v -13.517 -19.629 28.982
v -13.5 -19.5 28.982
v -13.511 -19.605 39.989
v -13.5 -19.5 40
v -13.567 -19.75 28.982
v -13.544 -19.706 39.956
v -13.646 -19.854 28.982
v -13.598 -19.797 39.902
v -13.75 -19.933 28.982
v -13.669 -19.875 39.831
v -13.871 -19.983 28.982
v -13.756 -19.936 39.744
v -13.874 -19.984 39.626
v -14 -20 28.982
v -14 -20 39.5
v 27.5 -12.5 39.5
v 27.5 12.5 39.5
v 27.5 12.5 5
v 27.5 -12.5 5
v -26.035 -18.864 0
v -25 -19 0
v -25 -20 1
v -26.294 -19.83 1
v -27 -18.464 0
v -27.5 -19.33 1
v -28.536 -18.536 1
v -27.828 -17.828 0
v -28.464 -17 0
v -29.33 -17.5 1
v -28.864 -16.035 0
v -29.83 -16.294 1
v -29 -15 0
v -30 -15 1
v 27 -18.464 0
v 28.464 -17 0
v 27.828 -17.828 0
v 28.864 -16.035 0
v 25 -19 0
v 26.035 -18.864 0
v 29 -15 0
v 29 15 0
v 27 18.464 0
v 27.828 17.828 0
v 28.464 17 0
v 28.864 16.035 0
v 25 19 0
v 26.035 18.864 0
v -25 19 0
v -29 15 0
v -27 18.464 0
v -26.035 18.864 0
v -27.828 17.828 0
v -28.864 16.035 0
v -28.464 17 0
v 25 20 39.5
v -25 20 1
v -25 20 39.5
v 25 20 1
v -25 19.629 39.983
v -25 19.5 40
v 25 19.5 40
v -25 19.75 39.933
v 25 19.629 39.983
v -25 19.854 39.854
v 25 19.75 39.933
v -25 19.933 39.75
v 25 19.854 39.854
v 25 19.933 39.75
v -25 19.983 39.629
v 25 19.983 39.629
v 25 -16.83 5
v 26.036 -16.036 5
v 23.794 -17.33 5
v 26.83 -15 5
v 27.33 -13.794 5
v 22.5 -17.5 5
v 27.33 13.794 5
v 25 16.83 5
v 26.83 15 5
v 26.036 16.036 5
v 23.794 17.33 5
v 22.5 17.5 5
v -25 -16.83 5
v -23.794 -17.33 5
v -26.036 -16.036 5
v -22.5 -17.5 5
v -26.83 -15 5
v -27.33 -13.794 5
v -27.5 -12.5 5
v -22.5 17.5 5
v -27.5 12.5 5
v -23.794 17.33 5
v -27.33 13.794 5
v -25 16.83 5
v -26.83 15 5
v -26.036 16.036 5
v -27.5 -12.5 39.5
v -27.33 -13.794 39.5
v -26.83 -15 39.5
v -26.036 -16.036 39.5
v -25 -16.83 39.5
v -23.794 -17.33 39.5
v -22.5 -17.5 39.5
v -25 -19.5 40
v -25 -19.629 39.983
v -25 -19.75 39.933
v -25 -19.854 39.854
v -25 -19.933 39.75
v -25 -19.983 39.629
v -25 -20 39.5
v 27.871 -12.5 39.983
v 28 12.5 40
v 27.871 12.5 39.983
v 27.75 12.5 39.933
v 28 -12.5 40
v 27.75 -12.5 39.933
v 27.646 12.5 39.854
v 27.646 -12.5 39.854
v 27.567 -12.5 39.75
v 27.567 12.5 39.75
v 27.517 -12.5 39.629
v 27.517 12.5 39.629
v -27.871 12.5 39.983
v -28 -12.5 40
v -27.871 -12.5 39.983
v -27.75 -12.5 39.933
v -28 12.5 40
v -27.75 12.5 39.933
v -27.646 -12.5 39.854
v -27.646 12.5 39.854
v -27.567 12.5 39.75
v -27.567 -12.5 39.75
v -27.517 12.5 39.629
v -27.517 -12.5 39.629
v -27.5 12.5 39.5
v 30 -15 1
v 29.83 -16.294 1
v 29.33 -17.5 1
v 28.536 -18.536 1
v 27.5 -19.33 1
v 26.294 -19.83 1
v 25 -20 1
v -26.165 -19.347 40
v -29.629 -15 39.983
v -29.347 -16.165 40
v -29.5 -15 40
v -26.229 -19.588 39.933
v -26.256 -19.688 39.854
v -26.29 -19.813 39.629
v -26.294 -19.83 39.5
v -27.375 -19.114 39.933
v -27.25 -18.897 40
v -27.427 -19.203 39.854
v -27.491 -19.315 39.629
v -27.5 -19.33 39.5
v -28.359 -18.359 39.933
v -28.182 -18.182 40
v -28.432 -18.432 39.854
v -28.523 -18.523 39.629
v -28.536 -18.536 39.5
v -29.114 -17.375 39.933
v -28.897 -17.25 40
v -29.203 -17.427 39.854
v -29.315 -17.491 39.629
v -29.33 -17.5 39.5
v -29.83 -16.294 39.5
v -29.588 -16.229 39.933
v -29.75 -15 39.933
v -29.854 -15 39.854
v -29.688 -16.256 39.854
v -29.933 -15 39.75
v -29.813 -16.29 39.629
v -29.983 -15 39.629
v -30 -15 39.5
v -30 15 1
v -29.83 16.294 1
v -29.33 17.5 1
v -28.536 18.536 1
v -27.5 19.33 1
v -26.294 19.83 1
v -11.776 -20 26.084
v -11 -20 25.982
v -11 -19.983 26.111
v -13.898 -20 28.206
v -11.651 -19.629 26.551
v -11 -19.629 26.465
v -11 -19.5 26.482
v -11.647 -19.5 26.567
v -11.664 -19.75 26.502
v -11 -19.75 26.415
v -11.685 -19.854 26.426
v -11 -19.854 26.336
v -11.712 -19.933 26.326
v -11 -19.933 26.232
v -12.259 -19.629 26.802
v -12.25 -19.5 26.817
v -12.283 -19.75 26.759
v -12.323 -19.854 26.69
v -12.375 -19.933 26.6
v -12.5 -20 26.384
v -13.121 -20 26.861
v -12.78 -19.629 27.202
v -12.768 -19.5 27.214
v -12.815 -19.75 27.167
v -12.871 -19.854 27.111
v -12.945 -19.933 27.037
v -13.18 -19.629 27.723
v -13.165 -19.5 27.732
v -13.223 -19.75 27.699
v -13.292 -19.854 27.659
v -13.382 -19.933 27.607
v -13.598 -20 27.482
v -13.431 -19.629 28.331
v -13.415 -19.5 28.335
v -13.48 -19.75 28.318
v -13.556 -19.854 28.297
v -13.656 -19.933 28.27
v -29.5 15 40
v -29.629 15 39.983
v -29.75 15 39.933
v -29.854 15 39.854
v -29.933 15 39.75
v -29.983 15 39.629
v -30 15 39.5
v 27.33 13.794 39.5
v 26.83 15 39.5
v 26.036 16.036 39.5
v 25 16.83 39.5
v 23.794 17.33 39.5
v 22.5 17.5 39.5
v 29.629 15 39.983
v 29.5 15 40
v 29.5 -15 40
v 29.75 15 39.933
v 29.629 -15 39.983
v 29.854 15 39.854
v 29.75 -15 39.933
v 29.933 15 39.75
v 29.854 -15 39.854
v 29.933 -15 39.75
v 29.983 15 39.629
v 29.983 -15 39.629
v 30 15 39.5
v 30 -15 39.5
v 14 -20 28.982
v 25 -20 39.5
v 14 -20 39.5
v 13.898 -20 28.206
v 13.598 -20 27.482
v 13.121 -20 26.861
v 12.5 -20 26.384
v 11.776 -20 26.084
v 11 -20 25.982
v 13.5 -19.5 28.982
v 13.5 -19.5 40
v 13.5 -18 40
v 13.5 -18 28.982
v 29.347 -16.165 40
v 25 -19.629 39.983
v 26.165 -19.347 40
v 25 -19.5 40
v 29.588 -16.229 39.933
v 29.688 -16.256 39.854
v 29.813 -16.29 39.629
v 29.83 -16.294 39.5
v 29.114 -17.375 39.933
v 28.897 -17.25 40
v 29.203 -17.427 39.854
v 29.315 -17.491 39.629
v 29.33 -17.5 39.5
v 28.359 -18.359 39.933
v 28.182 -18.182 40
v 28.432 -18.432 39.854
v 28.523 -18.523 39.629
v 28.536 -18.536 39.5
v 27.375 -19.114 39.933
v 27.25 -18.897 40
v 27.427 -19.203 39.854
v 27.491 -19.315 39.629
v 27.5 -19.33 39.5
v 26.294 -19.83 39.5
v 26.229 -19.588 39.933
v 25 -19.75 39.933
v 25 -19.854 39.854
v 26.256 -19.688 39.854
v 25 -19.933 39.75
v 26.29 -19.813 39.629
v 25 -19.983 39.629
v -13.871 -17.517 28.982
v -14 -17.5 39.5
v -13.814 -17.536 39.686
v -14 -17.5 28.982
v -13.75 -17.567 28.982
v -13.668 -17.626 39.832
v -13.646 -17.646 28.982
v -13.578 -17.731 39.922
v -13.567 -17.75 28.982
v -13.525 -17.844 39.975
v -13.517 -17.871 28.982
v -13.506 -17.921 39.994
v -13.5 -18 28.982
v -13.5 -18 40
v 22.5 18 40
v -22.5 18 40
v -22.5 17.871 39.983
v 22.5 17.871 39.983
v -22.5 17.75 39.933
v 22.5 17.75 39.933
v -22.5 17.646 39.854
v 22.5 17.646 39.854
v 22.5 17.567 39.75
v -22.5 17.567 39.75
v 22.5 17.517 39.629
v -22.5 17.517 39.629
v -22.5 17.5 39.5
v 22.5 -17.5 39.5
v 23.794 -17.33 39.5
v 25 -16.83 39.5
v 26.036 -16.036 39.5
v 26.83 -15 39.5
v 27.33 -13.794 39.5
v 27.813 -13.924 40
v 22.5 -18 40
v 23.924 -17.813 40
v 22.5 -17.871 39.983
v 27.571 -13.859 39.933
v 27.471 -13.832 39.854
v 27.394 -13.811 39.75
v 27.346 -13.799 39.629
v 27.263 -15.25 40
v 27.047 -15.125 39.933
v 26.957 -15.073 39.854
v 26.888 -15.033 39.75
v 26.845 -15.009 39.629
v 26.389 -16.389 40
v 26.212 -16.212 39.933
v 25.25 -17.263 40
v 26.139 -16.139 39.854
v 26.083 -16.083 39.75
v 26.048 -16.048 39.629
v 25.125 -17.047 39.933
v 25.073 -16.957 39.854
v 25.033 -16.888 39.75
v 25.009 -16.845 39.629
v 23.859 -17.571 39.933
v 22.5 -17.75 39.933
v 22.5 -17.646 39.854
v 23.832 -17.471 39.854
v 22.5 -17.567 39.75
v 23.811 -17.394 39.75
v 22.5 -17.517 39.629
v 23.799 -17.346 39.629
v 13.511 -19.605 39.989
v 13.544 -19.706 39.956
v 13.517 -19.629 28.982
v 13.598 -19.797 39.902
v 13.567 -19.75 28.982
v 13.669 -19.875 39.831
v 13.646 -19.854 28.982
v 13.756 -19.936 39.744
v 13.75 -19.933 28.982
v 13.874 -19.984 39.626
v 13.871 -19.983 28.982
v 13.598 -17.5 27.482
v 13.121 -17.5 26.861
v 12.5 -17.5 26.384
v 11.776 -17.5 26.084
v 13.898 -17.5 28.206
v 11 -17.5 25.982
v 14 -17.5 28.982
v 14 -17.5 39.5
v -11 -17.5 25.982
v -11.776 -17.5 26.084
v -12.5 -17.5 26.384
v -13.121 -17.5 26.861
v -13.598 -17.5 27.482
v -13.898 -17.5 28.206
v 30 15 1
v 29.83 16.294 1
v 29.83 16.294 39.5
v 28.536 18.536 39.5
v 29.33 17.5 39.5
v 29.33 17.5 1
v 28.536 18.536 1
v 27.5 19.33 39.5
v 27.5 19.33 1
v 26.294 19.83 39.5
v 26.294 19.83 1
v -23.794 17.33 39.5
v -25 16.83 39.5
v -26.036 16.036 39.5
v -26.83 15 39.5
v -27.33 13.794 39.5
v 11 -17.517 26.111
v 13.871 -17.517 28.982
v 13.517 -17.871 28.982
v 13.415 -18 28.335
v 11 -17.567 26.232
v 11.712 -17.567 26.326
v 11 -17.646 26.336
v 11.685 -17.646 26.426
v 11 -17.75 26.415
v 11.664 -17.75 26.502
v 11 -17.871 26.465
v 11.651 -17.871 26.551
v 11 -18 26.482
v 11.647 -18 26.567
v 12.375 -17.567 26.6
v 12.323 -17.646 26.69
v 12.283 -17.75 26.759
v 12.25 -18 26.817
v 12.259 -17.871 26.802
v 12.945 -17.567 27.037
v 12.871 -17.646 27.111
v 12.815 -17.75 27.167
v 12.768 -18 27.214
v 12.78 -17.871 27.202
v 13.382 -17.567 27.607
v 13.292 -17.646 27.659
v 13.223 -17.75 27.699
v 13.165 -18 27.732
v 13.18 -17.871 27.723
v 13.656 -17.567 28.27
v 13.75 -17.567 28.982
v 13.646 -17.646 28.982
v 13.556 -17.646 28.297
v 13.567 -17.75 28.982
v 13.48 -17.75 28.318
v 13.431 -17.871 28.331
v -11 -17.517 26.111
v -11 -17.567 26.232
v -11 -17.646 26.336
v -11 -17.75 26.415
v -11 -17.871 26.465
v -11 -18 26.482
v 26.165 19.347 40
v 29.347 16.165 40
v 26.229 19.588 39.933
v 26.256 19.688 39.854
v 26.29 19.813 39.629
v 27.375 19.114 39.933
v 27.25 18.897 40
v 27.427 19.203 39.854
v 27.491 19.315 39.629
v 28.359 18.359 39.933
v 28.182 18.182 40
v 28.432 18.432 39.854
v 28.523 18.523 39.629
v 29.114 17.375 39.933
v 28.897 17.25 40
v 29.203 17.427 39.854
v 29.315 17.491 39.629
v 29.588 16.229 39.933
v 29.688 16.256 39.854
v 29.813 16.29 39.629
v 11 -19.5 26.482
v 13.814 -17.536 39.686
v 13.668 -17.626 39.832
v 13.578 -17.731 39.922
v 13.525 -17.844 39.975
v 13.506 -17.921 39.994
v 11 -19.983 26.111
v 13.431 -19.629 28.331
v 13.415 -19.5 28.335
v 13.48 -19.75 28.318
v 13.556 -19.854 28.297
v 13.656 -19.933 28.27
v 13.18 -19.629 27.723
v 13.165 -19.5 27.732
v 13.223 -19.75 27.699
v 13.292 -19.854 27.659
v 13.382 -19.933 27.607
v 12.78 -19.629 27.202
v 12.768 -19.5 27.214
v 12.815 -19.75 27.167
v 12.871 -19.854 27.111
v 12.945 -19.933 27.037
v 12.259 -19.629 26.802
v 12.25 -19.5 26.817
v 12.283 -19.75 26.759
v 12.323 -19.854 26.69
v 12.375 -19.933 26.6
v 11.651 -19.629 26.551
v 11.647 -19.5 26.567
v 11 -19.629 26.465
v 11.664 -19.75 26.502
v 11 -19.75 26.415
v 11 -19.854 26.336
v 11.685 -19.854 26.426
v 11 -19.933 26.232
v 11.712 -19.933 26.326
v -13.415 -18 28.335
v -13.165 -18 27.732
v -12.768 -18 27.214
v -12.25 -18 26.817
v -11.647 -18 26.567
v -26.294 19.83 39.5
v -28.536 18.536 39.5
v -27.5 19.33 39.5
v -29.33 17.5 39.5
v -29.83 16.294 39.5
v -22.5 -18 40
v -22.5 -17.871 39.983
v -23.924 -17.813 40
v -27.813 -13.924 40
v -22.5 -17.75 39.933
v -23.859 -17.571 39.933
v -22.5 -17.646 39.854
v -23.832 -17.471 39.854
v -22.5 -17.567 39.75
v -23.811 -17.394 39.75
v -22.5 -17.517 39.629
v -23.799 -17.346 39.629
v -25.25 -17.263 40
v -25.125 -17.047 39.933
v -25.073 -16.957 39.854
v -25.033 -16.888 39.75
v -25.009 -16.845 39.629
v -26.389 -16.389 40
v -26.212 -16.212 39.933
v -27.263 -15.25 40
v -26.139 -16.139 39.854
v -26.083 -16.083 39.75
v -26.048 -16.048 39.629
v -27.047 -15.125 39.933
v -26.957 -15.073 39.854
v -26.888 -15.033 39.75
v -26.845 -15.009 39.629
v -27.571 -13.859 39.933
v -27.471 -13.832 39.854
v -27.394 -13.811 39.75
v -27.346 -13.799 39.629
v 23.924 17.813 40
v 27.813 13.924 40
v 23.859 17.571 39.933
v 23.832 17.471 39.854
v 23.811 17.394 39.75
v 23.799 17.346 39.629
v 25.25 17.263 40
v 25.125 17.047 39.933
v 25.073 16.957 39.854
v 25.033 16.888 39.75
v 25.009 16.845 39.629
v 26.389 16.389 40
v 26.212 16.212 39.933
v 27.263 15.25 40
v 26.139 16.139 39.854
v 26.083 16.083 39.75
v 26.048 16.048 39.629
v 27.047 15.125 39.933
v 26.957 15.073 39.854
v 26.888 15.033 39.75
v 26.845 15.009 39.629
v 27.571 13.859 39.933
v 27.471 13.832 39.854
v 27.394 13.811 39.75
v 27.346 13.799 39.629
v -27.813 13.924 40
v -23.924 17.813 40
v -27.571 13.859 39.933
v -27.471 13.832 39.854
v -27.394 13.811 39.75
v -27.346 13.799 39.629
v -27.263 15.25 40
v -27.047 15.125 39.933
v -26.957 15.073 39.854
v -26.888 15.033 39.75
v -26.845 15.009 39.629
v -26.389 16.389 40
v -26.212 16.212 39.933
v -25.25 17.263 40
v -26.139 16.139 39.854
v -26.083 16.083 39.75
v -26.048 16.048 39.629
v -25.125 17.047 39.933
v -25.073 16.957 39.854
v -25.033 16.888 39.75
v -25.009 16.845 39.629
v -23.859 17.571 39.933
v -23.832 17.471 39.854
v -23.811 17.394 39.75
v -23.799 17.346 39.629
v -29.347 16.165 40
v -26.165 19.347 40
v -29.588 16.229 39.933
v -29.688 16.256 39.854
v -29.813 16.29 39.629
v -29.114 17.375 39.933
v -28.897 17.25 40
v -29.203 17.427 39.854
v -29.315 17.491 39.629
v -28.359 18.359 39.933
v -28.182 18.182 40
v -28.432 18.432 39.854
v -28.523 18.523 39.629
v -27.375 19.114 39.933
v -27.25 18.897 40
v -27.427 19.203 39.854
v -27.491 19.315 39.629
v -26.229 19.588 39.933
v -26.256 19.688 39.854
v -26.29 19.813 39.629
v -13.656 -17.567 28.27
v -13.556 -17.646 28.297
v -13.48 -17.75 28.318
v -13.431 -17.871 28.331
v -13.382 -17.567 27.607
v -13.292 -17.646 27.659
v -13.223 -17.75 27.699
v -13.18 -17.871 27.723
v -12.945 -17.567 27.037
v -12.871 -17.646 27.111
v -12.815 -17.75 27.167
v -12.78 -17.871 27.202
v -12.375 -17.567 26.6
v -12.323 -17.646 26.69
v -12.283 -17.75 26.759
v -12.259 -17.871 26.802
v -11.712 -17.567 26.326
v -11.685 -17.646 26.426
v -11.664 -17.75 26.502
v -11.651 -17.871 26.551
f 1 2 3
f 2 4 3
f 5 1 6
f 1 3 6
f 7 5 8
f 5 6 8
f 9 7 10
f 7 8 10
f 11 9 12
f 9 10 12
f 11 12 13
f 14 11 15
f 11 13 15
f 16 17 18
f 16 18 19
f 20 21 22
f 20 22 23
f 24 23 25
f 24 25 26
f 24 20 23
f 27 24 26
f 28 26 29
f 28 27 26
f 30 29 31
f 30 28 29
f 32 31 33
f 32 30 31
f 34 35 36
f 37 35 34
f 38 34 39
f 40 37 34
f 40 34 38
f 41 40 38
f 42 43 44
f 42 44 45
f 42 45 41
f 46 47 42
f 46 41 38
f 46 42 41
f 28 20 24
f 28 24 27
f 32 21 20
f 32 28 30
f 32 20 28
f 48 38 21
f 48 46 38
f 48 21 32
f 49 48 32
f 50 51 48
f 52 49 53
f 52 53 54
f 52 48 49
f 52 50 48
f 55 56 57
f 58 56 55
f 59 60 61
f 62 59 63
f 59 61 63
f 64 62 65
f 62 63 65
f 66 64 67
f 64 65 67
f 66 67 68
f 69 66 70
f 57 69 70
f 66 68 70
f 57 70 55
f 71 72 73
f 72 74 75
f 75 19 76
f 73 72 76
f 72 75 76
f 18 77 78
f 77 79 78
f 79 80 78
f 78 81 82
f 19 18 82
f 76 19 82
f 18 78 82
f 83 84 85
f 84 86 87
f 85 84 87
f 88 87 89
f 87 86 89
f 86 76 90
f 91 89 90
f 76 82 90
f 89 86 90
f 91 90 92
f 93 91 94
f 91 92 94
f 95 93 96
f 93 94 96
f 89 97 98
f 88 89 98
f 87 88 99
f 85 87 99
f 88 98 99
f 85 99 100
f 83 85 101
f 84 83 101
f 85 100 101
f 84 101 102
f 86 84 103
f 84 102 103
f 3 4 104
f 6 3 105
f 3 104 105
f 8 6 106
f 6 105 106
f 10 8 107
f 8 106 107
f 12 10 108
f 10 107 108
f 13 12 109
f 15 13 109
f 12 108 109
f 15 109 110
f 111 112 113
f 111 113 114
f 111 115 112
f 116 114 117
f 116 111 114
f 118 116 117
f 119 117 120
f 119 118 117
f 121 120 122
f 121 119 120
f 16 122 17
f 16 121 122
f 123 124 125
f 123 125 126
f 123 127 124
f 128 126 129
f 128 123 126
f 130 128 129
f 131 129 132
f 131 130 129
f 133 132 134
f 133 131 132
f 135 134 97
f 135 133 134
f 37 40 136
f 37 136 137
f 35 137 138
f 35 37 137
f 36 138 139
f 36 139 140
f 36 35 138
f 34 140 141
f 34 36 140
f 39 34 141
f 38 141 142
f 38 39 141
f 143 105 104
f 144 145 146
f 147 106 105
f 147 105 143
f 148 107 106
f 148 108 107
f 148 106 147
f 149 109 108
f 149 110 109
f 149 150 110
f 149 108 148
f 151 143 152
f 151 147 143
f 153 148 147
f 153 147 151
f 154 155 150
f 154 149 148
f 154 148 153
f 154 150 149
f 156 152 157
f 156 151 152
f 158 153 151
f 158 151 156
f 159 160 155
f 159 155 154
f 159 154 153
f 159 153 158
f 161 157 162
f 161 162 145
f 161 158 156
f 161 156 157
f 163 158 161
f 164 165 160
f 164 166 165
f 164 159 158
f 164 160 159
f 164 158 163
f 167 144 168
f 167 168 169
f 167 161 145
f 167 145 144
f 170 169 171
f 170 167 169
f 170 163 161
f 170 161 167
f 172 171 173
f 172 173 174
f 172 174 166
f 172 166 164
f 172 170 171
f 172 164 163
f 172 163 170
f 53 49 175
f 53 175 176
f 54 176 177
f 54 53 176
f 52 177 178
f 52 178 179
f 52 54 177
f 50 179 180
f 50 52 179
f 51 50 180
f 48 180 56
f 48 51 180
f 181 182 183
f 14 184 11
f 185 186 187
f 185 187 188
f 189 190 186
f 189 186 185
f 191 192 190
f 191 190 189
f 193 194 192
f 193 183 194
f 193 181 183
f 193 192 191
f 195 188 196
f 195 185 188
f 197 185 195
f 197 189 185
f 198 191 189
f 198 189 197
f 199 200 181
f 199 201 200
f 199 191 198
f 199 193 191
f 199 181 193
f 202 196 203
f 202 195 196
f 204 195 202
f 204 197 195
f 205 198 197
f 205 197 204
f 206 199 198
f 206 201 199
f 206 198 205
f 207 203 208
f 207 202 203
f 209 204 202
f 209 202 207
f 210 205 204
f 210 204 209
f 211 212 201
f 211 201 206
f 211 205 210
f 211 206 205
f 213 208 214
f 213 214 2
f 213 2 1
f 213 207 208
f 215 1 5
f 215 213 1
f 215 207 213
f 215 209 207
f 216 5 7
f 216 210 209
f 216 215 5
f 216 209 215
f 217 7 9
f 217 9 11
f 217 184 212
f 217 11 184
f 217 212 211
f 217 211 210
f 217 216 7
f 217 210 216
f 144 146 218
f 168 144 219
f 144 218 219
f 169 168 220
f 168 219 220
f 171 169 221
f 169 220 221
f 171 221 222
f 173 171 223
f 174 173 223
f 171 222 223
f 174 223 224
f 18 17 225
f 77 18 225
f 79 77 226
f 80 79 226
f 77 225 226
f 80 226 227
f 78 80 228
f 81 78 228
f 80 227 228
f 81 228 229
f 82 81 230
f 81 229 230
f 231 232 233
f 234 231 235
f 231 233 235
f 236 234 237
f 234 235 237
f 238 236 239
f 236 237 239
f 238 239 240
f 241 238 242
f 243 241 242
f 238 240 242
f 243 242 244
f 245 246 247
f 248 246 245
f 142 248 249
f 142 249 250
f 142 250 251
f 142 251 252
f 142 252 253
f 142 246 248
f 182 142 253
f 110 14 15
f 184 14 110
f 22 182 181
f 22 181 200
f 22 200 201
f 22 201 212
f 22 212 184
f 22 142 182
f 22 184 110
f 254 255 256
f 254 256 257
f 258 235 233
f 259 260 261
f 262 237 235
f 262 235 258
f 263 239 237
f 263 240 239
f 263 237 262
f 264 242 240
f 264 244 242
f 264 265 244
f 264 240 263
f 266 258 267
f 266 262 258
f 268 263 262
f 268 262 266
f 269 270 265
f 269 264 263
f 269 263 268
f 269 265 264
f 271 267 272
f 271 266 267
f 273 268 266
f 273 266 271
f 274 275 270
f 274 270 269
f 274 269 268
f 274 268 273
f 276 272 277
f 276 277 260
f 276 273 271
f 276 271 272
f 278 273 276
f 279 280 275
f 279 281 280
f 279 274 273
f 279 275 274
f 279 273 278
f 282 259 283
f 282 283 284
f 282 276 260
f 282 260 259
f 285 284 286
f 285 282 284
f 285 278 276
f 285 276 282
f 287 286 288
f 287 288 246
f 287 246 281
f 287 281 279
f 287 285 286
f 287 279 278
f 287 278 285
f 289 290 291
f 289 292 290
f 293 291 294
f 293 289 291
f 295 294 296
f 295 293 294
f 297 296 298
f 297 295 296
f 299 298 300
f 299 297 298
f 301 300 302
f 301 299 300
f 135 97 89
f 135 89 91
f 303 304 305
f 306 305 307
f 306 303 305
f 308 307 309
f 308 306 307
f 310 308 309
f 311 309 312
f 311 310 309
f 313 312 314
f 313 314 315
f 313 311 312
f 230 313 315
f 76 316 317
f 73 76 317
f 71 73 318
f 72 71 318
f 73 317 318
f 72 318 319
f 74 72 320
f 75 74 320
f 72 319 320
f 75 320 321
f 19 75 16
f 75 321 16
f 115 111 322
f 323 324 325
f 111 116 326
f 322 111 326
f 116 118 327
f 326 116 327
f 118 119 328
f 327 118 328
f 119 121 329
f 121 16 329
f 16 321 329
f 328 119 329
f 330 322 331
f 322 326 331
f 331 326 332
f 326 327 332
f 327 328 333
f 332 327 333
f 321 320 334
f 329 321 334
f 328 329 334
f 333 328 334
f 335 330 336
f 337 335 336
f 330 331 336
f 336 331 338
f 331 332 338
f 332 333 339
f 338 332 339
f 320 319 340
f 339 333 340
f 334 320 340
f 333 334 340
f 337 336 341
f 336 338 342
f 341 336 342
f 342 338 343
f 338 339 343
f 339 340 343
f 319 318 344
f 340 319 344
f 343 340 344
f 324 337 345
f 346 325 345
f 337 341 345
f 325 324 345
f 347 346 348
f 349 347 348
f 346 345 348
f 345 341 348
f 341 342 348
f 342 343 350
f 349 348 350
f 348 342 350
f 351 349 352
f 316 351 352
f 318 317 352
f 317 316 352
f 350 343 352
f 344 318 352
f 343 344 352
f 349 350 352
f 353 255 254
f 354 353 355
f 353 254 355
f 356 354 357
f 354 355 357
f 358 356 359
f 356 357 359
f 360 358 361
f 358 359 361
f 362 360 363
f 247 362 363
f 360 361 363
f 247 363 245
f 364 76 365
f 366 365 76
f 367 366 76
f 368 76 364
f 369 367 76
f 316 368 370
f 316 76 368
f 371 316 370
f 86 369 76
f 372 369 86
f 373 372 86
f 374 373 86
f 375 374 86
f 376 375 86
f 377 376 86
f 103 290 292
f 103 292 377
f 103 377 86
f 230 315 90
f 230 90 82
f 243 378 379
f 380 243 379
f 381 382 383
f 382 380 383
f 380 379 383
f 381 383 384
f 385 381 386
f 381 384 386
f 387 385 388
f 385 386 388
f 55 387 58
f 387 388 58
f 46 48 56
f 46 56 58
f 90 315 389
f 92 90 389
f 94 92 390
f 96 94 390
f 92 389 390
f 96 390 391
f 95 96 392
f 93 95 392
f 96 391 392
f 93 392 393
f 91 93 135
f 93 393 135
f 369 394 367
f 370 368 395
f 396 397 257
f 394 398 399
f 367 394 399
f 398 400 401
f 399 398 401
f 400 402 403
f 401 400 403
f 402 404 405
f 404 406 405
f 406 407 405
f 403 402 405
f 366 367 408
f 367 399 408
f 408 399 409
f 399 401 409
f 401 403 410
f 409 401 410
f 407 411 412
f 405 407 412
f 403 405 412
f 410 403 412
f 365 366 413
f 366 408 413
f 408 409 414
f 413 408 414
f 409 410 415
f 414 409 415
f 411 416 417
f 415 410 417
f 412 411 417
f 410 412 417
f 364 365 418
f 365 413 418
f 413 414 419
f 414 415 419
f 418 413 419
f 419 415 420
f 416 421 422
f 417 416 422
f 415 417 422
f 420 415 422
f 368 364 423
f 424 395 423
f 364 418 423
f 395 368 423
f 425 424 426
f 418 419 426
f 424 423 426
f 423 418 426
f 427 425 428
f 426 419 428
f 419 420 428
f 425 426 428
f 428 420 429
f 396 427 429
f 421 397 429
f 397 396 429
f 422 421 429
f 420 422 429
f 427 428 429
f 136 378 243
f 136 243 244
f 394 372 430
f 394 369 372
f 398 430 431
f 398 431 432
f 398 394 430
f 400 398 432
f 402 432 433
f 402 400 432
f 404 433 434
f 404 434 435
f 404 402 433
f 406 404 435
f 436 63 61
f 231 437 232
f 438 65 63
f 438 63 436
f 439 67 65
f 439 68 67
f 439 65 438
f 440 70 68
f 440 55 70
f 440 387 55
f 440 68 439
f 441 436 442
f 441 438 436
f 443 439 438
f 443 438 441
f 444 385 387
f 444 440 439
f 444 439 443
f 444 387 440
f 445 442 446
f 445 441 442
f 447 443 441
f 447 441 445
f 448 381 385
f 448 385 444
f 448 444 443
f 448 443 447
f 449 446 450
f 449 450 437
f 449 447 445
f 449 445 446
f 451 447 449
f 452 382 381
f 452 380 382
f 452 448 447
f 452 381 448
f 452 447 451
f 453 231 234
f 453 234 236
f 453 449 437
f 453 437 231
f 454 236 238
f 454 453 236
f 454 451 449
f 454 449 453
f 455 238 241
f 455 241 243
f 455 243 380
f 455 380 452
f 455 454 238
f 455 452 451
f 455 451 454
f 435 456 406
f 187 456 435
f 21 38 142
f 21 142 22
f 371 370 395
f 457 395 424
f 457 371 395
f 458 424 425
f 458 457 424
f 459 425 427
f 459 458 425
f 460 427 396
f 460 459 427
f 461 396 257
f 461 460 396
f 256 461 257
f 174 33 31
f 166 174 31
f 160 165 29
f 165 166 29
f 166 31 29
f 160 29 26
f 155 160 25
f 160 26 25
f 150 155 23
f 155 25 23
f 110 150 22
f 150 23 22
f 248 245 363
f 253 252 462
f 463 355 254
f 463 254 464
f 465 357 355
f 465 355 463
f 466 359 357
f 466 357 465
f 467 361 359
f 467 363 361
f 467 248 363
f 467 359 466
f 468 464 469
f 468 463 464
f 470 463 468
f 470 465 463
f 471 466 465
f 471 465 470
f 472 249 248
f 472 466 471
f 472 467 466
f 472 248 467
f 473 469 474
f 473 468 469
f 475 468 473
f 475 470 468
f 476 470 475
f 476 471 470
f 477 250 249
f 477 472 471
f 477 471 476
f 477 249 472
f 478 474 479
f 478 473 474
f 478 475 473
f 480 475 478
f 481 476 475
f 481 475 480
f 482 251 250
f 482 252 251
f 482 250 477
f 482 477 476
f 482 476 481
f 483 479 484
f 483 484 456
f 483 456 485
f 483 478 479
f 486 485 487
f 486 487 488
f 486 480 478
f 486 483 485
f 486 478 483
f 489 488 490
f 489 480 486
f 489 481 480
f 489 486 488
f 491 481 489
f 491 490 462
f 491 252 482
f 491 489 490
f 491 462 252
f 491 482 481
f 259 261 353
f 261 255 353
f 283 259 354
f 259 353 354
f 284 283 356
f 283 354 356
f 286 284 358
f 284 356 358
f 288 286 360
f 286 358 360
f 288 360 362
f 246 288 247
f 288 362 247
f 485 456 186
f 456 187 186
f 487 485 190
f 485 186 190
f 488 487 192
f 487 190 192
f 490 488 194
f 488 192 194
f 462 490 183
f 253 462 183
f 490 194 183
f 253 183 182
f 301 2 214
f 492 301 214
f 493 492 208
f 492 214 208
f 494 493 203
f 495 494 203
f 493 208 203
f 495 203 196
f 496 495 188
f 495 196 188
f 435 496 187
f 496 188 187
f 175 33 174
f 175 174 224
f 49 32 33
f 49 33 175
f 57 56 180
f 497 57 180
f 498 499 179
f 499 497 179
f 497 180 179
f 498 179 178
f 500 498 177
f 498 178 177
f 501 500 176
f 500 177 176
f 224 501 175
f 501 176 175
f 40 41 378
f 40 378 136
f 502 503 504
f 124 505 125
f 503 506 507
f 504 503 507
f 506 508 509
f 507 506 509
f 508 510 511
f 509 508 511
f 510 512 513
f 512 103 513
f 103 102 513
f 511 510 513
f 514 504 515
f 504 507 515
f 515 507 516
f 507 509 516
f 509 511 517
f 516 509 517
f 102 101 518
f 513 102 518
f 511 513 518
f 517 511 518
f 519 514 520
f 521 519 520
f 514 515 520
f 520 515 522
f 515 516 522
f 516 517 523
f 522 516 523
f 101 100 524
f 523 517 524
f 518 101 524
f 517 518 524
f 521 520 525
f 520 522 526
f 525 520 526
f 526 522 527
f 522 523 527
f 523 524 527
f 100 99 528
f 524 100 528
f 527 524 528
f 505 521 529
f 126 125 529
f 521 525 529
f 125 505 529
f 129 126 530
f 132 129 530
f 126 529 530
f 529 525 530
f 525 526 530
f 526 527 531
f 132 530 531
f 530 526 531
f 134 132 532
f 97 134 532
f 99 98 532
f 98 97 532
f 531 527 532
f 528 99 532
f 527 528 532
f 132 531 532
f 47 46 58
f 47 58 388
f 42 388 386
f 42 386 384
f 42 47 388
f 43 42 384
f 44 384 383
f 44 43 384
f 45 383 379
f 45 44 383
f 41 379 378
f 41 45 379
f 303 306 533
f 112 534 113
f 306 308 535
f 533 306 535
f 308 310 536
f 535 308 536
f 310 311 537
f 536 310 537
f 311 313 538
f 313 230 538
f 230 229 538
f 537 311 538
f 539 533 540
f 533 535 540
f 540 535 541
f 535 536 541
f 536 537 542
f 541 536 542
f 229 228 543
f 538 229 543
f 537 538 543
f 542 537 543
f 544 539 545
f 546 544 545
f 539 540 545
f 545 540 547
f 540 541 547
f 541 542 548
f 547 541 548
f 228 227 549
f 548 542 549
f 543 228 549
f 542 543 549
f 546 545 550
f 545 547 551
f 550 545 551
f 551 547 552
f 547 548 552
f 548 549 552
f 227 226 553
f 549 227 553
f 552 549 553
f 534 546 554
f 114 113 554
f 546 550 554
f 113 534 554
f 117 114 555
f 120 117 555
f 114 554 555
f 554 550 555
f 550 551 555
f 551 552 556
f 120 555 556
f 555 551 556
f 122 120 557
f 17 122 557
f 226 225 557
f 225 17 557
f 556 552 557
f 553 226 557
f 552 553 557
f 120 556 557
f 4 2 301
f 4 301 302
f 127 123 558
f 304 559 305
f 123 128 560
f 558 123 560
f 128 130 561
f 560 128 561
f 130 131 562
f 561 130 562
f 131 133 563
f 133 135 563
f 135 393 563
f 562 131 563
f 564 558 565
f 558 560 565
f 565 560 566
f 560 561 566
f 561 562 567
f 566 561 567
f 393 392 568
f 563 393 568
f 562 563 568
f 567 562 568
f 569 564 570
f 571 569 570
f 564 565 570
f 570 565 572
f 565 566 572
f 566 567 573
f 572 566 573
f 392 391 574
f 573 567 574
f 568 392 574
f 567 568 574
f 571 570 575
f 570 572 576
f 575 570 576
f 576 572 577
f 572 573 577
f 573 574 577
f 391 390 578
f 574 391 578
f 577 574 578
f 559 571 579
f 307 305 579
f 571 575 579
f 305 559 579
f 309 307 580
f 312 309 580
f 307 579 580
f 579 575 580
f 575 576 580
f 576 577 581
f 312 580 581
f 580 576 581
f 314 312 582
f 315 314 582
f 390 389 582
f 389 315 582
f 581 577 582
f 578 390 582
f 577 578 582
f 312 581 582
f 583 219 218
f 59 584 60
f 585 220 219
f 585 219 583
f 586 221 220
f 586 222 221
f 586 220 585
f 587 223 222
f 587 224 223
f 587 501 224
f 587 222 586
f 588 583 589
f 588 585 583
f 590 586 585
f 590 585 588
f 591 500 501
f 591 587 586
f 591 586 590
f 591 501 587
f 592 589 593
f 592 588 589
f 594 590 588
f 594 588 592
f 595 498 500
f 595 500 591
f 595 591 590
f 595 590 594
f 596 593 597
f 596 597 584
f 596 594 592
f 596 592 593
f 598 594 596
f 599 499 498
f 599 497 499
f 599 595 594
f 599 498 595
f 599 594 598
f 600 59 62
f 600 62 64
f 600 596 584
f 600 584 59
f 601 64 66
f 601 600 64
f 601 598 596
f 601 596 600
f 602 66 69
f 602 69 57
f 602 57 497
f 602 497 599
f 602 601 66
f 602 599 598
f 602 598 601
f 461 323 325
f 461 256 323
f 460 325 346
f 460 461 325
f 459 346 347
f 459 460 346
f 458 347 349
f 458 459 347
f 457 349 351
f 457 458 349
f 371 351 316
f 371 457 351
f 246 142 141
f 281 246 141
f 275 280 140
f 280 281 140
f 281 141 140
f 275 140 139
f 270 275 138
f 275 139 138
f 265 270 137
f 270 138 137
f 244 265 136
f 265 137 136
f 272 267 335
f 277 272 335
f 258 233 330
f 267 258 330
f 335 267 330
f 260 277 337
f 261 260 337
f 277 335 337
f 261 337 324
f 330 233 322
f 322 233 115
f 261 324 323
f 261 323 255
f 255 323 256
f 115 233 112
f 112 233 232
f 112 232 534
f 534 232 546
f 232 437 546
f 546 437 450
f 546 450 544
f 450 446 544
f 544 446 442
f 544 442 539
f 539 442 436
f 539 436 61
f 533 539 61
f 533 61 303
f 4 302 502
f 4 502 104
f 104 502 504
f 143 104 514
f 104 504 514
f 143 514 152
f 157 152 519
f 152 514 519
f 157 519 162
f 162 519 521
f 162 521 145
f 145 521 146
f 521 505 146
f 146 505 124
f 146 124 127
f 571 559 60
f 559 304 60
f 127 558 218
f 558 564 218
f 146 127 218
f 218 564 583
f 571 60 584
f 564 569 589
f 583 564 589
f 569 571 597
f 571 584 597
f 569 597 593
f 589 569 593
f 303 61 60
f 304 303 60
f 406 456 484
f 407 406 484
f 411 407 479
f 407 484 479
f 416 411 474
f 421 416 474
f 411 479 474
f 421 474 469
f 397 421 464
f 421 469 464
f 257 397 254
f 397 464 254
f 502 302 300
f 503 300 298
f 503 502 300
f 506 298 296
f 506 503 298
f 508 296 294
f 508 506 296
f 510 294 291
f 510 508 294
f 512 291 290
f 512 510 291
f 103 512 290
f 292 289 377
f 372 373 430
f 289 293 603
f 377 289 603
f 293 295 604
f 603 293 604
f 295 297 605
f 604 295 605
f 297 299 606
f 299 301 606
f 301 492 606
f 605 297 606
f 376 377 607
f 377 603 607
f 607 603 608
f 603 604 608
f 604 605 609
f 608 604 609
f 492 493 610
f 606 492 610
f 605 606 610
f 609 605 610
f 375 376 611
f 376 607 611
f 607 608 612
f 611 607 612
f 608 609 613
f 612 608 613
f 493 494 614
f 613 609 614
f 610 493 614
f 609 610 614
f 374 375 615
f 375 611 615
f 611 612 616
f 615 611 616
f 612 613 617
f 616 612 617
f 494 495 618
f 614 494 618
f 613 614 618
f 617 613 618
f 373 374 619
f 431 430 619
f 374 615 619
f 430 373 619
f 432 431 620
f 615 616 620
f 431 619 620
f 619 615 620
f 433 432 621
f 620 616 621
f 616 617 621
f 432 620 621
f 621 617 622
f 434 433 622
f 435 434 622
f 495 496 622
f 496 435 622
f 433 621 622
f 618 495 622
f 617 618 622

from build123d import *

# Parameters (mm, degrees)
PAD_DEPTH       = 40
POCKET_DEPTH    = 35
POCKET001_DEPTH = 5
FILLET_R        = 0.5
FILLET001_R     = 0.5
CHAMFER_SIZE    = 1


with BuildPart() as part:
    # Sketch → Pad (new body)
    with BuildSketch(Plane.XY):
        with BuildLine():
            Line((-25, 20), (25, 20))
            ThreePointArc((30, 15), (28.535534, 18.535534), (25, 20))
            Line((30, 15), (30, -15))
            ThreePointArc((25, -20), (28.535534, -18.535534), (30, -15))
            Line((25, -20), (-25, -20))
            ThreePointArc((-30, -15), (-28.535534, -18.535534), (-25, -20))
            Line((-30, -15), (-30, 15))
            ThreePointArc((-25, 20), (-28.535534, 18.535534), (-30, 15))
        make_face()
    extrude(amount=PAD_DEPTH)

    # Sketch001 (on Face10 of Pad) → Pocket (cut)
    with BuildSketch(Plane.XY.offset(40)):
        with BuildLine():
            Line((-22.5, 17.5), (22.5, 17.5))
            ThreePointArc((27.5, 12.5), (26.035534, 16.035534), (22.5, 17.5))
            Line((27.5, 12.5), (27.5, -12.5))
            ThreePointArc((22.5, -17.5), (26.035534, -16.035534), (27.5, -12.5))
            Line((22.5, -17.5), (-22.5, -17.5))
            ThreePointArc((-27.5, -12.5), (-26.035534, -16.035534), (-22.5, -17.5))
            Line((-27.5, -12.5), (-27.5, 12.5))
            ThreePointArc((-22.5, 17.5), (-26.035534, 16.035534), (-27.5, 12.5))
        make_face()
    extrude(amount=-POCKET_DEPTH, mode=Mode.SUBTRACT)

    # Sketch002 (on Face6 of Pocket) → Pocket001 (cut)
    with BuildSketch(Plane.XZ.offset(20)):
        with BuildLine():
            Line((-13.5, 40), (13.5, 40))
            Line((13.5, 40), (13.5, 28.982013))
            ThreePointArc((11, 26.482013), (12.767767, 27.214246), (13.5, 28.982013))
            Line((11, 26.482013), (-11, 26.482013))
            ThreePointArc((-13.5, 28.982013), (-12.767767, 27.214246), (-11, 26.482013))
            Line((-13.5, 28.982013), (-13.5, 40))
        make_face()
    extrude(amount=-POCKET001_DEPTH, mode=Mode.SUBTRACT)

    # Fillet
    fillet_edges = [part.edges().sort_by_distance(p)[0] for p in [
        (13.5, -17.5, 34.491006),
        (12.767767, -17.5, 27.214246),
        (0, -17.5, 26.482013),
        (-12.767767, -17.5, 27.214246),
        (-13.5, -17.5, 34.491006),
        (-18, -17.5, 40),
        (-26.035534, -16.035534, 40),
        (-27.5, 0, 40),
        (-26.035534, 16.035534, 40),
        (0, 17.5, 40),
        (26.035534, 16.035534, 40),
        (27.5, 0, 40),
        (26.035534, -16.035534, 40),
        (18, -17.5, 40),
    ]]
    fillet(fillet_edges, radius=FILLET_R)

    # Fillet001
    fillet001_edges = [part.edges().sort_by_distance(p)[0] for p in [
        (-19.25, -20, 40),
        (-13.5, -20, 34.491006),
        (-12.767767, -20, 27.214246),
        (0, -20, 26.482013),
        (12.767767, -20, 27.214246),
        (13.5, -20, 34.491006),
        (19.25, -20, 40),
        (28.535534, -18.535534, 40),
        (30, 0, 40),
        (28.535534, 18.535534, 40),
        (0, 20, 40),
        (-28.535534, 18.535534, 40),
        (-30, 0, 40),
        (-28.535534, -18.535534, 40),
    ]]
    fillet(fillet001_edges, radius=FILLET001_R)

    # Chamfer
    chamfer_edges = [part.edges().sort_by_distance(p)[0] for p in [
        (0, -20, 0),
        (28.535534, -18.535534, 0),
        (30, 0, 0),
        (28.535534, 18.535534, 0),
        (0, 20, 0),
        (-28.535534, 18.535534, 0),
        (-30, 0, 0),
        (-28.535534, -18.535534, 0),
    ]]
    chamfer(chamfer_edges, length=CHAMFER_SIZE)


solid = part.part
